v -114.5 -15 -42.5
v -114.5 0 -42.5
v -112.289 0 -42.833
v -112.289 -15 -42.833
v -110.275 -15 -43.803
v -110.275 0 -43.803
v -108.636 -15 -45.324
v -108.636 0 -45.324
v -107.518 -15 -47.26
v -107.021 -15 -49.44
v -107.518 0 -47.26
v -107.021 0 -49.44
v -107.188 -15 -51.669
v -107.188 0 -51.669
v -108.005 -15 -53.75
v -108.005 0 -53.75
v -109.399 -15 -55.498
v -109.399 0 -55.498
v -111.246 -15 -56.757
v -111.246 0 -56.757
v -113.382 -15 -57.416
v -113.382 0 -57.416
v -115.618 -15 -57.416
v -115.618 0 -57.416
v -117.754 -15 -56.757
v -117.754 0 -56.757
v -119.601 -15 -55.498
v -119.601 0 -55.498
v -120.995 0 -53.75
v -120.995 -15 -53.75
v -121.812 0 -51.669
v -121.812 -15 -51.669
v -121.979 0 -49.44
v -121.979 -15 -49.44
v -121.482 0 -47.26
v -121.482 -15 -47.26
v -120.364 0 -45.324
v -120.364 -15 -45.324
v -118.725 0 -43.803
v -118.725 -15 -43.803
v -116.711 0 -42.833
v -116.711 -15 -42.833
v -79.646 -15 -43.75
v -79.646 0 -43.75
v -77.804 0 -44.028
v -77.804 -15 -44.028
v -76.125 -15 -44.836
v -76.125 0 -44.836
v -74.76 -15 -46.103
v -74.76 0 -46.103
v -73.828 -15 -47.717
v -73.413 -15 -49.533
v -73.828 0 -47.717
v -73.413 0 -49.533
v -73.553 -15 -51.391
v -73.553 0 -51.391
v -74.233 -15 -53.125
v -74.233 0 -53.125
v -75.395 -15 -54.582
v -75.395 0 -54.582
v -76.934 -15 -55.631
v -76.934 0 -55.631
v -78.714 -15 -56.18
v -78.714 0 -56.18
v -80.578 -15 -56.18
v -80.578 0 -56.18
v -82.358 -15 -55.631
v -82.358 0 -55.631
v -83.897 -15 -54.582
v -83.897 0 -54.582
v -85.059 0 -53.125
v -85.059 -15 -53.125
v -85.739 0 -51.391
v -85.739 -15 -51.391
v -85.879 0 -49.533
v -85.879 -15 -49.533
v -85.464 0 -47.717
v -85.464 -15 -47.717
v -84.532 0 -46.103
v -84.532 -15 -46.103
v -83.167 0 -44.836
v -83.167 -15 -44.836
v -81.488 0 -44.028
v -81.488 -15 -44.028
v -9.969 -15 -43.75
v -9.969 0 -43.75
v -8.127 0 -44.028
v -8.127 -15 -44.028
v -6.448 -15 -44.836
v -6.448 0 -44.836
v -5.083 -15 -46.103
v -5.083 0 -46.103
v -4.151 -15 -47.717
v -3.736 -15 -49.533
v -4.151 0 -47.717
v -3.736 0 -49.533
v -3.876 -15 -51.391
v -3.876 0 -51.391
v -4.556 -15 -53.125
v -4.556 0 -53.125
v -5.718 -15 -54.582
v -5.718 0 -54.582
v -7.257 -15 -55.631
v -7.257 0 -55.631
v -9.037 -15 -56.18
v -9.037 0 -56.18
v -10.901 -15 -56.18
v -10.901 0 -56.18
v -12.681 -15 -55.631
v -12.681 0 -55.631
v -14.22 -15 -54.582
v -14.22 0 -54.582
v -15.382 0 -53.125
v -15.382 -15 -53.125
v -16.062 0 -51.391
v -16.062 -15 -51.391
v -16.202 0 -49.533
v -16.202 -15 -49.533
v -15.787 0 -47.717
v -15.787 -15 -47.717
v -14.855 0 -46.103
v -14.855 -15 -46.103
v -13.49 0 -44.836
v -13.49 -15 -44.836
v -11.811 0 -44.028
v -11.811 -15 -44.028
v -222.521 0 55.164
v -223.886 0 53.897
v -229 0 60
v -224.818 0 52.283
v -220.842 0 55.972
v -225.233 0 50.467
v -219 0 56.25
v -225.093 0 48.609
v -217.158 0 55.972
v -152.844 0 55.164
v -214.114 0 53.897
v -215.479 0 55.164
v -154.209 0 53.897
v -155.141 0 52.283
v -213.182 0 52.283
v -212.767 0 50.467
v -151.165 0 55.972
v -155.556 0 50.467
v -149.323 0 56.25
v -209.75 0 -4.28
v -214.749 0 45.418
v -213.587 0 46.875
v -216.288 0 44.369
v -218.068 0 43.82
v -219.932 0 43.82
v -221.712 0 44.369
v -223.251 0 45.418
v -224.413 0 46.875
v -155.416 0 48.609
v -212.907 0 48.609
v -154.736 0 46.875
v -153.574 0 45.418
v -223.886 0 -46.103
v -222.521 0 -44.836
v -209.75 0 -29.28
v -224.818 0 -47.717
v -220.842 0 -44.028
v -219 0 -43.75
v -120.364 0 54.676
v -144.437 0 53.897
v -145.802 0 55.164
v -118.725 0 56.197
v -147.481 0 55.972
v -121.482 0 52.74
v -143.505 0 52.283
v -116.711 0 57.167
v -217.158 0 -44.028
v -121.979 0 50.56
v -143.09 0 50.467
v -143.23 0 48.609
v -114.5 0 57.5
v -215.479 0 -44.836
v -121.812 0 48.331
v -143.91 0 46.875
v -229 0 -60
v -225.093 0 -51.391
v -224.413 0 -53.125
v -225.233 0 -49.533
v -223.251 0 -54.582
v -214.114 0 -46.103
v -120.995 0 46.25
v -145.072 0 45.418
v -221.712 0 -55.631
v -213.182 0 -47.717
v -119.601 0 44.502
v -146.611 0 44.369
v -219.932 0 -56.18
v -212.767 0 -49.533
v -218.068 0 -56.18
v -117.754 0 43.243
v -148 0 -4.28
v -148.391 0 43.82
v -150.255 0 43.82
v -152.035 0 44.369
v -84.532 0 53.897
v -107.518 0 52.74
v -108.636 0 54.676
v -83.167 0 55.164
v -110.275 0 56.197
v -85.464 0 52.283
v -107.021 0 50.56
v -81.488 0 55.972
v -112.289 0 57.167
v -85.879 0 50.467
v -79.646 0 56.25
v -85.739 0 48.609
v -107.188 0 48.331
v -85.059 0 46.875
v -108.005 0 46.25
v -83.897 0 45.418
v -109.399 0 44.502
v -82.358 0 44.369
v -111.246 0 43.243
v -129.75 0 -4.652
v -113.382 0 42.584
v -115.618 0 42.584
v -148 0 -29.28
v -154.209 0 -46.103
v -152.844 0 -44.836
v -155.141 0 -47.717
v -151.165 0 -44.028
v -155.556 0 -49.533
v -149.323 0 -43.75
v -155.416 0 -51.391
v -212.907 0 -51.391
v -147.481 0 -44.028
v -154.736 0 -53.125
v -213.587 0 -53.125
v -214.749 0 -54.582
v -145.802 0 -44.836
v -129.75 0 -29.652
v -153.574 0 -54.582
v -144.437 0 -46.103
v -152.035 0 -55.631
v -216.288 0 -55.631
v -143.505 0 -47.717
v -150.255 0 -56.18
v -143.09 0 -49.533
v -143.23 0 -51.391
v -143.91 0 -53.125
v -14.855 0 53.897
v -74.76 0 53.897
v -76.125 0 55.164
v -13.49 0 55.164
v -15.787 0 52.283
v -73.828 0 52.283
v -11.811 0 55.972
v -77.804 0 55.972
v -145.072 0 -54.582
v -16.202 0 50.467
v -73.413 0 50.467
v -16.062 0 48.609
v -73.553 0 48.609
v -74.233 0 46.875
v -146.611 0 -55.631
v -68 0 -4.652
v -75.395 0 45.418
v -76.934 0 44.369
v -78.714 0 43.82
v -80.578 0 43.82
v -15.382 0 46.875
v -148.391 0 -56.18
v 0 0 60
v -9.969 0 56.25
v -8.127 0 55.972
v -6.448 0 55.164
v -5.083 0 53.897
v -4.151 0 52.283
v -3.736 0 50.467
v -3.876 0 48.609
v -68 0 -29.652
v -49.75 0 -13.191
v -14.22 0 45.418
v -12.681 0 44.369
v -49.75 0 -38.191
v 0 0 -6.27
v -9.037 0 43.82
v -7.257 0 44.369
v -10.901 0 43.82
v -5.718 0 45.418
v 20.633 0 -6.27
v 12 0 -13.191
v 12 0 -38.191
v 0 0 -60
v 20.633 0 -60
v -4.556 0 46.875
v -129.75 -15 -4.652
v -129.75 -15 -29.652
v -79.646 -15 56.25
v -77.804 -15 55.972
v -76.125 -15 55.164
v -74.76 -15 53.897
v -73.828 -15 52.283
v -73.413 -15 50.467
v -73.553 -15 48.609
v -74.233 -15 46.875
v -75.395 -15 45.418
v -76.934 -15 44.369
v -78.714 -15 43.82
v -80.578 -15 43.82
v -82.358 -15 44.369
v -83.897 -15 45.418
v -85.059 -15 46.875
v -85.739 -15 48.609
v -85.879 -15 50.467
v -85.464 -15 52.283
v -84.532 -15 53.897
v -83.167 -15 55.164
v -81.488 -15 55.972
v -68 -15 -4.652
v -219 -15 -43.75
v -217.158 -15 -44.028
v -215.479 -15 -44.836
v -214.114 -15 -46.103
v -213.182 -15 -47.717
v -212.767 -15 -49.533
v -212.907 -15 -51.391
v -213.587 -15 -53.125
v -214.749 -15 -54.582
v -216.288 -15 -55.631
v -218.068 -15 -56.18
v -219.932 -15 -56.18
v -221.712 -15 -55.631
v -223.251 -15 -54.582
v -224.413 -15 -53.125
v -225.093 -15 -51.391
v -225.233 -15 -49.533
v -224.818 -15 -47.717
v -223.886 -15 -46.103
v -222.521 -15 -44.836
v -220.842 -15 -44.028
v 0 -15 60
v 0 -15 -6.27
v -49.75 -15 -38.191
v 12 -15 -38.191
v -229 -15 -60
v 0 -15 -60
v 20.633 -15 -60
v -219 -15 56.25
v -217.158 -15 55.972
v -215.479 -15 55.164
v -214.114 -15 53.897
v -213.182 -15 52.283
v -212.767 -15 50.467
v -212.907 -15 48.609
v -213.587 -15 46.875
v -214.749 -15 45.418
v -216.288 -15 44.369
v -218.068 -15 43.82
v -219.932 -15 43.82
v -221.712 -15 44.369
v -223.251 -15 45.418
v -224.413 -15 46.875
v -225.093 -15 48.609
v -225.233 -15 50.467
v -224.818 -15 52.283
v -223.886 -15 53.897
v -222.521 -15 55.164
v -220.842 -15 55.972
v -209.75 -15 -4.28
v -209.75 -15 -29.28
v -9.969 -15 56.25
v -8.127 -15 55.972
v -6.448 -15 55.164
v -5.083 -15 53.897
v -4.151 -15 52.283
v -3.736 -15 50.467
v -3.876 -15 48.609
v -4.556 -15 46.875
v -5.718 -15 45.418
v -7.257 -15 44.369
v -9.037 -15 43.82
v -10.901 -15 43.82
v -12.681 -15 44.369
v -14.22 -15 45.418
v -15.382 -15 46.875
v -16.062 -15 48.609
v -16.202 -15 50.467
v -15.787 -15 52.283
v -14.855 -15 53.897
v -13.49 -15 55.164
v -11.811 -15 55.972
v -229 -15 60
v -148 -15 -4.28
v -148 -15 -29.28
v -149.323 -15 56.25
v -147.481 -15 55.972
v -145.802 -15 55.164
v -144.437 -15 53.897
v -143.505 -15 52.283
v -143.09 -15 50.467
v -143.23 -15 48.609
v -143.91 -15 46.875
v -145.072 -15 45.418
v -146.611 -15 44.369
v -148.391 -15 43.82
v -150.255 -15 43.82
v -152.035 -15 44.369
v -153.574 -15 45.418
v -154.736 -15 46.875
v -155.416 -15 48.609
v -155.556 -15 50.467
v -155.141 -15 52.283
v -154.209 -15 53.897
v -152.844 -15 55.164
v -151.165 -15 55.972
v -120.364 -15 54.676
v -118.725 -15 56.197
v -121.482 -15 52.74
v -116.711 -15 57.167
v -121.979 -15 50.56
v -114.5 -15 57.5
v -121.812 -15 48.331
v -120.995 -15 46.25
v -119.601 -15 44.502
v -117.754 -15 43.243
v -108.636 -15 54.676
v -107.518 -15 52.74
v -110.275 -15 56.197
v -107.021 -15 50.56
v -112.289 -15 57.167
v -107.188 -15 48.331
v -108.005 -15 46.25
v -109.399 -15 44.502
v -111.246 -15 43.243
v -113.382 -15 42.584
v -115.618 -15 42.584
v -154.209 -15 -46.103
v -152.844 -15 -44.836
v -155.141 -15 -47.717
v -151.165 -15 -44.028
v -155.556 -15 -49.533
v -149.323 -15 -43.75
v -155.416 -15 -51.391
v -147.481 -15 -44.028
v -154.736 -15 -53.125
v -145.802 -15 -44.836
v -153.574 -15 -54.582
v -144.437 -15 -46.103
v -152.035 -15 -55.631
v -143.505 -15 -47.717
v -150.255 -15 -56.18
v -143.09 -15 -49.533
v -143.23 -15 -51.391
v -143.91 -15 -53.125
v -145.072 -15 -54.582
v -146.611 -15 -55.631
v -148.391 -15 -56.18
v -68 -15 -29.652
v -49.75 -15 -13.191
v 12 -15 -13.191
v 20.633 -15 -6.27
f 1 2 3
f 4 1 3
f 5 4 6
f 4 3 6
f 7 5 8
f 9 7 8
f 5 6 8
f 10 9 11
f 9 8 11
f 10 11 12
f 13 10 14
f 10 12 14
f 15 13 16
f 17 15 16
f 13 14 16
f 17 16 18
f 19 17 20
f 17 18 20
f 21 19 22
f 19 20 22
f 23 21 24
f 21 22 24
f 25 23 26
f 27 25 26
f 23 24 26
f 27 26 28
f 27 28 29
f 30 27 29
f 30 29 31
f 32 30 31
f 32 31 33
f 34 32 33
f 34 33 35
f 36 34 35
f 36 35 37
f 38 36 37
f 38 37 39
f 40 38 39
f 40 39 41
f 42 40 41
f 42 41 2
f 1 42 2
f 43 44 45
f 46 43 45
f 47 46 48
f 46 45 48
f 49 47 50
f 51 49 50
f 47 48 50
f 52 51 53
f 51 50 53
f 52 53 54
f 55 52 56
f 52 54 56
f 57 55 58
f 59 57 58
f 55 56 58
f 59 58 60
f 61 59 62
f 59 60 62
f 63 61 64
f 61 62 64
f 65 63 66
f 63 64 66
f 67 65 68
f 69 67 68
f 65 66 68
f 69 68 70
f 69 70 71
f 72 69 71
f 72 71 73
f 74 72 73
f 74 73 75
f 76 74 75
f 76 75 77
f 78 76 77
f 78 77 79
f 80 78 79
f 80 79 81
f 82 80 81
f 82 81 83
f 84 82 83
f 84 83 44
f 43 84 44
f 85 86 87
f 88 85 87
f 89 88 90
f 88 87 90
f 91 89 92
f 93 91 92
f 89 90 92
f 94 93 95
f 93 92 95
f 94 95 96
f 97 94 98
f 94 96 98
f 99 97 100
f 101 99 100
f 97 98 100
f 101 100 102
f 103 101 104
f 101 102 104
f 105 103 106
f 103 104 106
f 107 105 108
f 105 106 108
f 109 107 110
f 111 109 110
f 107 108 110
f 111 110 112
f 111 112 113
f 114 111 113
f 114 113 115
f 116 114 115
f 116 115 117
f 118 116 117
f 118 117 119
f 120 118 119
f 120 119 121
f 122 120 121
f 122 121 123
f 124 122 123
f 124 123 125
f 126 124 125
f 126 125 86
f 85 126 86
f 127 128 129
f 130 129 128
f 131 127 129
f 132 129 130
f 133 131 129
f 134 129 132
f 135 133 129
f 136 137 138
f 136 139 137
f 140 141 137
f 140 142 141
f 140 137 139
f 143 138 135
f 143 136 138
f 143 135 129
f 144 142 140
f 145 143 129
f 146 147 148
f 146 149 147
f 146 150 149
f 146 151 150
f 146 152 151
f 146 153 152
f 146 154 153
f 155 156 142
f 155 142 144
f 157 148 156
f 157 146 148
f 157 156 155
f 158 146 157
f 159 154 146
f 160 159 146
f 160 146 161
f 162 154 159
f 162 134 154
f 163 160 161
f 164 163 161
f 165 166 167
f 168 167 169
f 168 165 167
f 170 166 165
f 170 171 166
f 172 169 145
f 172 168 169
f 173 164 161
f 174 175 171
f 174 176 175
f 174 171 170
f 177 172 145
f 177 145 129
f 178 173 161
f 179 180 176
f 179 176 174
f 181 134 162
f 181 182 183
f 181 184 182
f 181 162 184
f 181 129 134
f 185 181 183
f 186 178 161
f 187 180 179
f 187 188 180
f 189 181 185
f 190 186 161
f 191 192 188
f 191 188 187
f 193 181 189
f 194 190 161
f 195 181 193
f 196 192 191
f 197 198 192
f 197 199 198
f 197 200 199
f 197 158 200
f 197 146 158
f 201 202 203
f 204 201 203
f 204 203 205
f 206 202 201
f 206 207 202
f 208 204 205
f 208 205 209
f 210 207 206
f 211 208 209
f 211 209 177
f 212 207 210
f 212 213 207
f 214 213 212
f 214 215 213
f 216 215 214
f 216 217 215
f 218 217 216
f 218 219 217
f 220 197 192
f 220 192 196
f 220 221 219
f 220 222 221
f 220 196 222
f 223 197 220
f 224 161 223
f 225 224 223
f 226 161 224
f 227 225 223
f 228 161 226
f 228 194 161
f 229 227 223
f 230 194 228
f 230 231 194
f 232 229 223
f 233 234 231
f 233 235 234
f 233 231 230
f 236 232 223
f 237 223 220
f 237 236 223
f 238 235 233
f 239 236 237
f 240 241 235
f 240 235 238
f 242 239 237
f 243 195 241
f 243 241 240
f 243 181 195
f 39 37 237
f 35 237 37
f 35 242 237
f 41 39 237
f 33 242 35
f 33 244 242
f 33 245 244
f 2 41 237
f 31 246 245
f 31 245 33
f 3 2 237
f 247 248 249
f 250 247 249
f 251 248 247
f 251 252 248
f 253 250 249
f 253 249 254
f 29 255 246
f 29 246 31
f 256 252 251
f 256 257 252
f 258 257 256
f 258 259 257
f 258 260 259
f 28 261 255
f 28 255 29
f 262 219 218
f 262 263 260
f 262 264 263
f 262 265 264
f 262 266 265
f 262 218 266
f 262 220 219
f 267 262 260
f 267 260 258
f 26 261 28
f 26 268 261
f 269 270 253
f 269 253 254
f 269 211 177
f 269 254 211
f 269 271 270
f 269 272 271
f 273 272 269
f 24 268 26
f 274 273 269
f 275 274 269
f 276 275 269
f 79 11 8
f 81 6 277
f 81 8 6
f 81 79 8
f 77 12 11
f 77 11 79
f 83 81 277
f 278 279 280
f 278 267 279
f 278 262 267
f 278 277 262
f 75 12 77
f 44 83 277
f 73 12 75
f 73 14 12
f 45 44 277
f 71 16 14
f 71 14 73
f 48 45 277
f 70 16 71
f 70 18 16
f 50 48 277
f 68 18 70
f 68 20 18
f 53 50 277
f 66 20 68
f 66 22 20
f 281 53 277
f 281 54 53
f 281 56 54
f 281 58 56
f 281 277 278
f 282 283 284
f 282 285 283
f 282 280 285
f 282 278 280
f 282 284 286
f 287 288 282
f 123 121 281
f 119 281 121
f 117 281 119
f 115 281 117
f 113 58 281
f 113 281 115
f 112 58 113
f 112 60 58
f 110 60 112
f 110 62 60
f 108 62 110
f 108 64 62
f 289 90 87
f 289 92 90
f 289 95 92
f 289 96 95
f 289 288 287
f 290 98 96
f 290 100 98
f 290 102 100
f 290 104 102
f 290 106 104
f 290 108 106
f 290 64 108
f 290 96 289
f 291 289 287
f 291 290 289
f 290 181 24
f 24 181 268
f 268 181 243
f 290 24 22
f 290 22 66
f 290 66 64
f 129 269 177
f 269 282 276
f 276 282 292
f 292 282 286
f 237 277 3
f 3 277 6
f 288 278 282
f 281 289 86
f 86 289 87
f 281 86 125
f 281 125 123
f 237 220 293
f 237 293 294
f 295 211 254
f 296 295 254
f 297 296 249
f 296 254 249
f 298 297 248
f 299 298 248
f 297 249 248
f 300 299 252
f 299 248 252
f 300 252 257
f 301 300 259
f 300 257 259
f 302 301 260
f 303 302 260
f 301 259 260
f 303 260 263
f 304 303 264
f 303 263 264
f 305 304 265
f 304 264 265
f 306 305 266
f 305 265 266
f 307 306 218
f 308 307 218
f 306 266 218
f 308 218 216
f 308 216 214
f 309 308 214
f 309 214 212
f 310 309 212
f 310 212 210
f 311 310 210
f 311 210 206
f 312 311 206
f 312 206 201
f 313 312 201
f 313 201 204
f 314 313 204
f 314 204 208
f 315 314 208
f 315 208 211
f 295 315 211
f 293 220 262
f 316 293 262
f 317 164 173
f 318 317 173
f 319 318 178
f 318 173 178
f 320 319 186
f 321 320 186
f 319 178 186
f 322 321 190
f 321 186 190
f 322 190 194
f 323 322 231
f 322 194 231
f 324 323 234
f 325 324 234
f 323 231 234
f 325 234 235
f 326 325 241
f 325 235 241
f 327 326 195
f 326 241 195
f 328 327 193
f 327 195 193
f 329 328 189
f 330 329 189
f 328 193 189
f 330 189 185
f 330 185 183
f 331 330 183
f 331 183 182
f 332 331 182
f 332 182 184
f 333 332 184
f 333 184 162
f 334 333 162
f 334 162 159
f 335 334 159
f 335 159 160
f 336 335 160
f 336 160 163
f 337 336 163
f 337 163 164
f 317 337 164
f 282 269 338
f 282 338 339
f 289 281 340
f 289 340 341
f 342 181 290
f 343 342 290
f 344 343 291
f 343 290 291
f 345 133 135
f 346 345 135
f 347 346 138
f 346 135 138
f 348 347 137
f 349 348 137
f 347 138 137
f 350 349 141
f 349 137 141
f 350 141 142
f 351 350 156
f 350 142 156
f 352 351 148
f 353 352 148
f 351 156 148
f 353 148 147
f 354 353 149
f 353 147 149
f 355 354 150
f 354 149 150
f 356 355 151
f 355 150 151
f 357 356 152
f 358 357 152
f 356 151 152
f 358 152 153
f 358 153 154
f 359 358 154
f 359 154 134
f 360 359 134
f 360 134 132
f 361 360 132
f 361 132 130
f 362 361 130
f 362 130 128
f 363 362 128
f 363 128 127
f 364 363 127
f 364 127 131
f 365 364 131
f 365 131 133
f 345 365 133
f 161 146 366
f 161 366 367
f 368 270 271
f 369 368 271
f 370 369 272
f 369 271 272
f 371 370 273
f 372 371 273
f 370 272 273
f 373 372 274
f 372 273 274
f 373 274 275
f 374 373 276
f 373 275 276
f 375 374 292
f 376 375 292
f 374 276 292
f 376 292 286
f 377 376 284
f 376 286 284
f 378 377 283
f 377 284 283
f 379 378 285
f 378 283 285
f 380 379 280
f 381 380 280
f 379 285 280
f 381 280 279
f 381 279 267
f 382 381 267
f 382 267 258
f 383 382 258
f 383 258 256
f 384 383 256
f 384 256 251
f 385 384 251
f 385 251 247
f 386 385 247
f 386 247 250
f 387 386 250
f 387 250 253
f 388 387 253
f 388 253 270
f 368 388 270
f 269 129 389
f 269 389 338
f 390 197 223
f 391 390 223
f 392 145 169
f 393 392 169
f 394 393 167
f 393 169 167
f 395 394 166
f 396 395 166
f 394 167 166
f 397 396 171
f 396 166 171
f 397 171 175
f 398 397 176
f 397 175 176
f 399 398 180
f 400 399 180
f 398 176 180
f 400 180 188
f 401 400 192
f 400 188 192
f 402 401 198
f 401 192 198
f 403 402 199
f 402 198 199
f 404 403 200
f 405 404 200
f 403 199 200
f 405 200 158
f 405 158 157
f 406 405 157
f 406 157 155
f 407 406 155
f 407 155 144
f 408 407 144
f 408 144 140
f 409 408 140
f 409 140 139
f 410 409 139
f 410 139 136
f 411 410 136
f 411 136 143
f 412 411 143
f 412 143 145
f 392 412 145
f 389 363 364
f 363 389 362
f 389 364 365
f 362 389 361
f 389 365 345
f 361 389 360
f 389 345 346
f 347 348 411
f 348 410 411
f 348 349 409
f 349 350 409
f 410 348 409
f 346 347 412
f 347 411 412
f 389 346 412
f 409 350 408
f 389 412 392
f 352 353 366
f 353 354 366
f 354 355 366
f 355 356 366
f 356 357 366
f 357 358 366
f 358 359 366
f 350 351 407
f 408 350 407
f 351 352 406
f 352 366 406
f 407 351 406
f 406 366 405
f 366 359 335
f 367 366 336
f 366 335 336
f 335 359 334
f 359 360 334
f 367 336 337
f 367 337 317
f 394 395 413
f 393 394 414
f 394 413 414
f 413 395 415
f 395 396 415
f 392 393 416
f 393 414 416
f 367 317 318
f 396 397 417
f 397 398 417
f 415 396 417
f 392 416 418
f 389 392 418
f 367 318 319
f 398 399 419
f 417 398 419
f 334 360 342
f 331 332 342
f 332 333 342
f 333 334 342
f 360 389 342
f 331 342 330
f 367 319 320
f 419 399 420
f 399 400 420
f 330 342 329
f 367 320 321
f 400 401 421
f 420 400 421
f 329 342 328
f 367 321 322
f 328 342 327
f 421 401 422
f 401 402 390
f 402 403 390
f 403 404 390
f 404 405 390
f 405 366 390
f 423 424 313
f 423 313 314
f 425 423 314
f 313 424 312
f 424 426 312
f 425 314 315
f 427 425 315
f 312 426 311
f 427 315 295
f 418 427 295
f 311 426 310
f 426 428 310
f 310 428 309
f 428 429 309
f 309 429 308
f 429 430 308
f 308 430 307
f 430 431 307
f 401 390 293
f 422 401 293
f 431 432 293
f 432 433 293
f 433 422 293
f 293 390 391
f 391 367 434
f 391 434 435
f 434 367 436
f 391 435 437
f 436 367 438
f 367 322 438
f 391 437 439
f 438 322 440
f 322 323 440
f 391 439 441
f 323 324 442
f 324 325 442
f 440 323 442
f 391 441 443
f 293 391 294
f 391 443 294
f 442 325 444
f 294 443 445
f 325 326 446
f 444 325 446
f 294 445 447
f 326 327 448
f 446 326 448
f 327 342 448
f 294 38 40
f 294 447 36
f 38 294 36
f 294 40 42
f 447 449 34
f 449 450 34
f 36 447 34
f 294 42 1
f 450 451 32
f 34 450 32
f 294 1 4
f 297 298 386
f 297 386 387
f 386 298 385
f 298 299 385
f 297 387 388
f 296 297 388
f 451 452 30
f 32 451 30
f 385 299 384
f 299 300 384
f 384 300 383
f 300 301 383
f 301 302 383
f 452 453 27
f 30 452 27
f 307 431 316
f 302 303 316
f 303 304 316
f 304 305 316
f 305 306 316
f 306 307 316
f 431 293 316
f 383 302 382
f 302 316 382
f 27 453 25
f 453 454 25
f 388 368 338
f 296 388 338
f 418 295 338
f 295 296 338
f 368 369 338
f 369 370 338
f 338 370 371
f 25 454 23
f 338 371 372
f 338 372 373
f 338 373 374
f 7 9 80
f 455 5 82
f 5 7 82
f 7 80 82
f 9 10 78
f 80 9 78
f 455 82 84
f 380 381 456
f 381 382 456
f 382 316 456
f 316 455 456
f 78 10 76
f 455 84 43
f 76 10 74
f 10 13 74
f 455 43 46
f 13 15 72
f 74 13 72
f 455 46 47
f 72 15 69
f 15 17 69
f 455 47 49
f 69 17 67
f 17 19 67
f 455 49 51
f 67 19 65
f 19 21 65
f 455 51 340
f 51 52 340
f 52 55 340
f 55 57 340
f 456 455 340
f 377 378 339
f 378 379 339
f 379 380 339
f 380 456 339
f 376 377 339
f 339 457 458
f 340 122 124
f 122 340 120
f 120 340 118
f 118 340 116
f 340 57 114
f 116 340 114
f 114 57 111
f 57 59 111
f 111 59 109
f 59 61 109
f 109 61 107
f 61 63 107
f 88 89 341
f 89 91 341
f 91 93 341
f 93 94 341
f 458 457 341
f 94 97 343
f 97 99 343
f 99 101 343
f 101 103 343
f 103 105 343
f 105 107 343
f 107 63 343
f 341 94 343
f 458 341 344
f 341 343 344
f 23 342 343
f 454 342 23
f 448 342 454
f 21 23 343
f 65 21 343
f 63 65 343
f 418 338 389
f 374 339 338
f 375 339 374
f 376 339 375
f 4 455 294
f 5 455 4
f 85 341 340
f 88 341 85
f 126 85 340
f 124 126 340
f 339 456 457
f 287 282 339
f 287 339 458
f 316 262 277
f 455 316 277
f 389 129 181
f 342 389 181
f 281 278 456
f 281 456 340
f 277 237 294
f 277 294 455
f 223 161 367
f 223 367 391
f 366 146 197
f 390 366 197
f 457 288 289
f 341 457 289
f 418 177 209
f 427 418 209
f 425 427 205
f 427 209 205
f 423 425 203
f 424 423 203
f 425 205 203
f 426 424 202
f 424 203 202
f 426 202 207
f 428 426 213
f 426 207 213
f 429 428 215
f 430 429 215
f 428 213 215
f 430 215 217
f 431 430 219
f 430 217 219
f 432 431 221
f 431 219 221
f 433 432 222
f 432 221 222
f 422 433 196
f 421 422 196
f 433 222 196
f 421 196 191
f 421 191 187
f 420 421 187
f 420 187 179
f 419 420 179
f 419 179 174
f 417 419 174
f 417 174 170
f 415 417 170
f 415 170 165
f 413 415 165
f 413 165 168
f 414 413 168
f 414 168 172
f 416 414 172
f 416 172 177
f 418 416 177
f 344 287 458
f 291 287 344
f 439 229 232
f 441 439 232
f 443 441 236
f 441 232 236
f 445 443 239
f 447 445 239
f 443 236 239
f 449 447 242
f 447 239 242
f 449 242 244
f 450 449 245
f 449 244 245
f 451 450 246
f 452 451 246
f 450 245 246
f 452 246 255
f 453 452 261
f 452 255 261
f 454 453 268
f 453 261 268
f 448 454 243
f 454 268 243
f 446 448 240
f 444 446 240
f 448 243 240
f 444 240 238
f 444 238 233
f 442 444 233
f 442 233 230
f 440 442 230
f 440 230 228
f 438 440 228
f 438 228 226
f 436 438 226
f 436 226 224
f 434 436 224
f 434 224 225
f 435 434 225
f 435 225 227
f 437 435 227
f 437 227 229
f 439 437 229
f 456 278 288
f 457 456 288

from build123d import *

# Parameters (mm, degrees)
SKETCH1_W           = 229
SKETCH1_H           = 120
BOSS_EXTRUDE1_DEPTH = 15
SKETCH2_W           = 20.632503002
SKETCH2_H           = 53.730004003
BOSS_EXTRUDE2_DEPTH = 15
CUT_EXTRUDE1_REACH  = 239.205
SKETCH3_W           = 61.75
SKETCH3_H           = 25
CUT_EXTRUDE2_REACH  = 239.205
SKETCH4_W           = 61.75
SKETCH4_H           = 25
CUT_EXTRUDE3_REACH  = 239.205
SKETCH5_W           = 61.75
SKETCH5_H           = 25
CUT_EXTRUDE5_REACH  = 239.205
SKETCH7_R           = 7.5
CUT_EXTRUDE7_REACH  = 239.205
SKETCH14_R          = 6.25


with BuildPart() as part:
    # Sketch1 → Boss-Extrude1 (new body)
    with BuildSketch(Plane(origin=(0, 0, 0), x_dir=(1, 0, 0), z_dir=(0, 1, 0))):
        with Locations((-114.5, 0)):
            Rectangle(SKETCH1_W, SKETCH1_H)
    extrude(amount=-BOSS_EXTRUDE1_DEPTH)

    # Sketch2 → Boss-Extrude2 (add)
    with BuildSketch(Plane(origin=(0, 0, 0), x_dir=(1, 0, 0), z_dir=(0, 1, 0))):
        with Locations((10.316251501, 33.134997999)):
            Rectangle(SKETCH2_W, SKETCH2_H)
    extrude(amount=-BOSS_EXTRUDE2_DEPTH)

    # Sketch3 → Cut-Extrude1 (cut, up to next)
    with BuildSketch(Plane(origin=(0, 0, 0), x_dir=(1, 0, 0), z_dir=(0, 1, 0)), mode=Mode.PRIVATE) as cut_extrude1_sk1:
        with Locations((-18.875, 25.691000385)):
            Rectangle(SKETCH3_W, SKETCH3_H)
    cut_extrude1_tool1 = extrude(cut_extrude1_sk1.sketch, amount=-CUT_EXTRUDE1_REACH, mode=Mode.PRIVATE) & part.part
    add(cut_extrude1_tool1.solids().sort_by_distance((-18.875, 0, -25.691))[0], mode=Mode.SUBTRACT)

    # Sketch4 → Cut-Extrude2 (cut, up to next)
    with BuildSketch(Plane(origin=(0, 0, 0), x_dir=(1, 0, 0), z_dir=(0, 1, 0)), mode=Mode.PRIVATE) as cut_extrude2_sk1:
        with Locations((-98.875, 17.152366083)):
            Rectangle(SKETCH4_W, SKETCH4_H)
    cut_extrude2_tool1 = extrude(cut_extrude2_sk1.sketch, amount=-CUT_EXTRUDE2_REACH, mode=Mode.PRIVATE) & part.part
    add(cut_extrude2_tool1.solids().sort_by_distance((-98.875, 0, -17.152366))[0], mode=Mode.SUBTRACT)

    # Sketch5 → Cut-Extrude3 (cut, up to next)
    with BuildSketch(Plane(origin=(0, 0, 0), x_dir=(1, 0, 0), z_dir=(0, 1, 0)), mode=Mode.PRIVATE) as cut_extrude3_sk1:
        with Locations((-178.875, 16.78)):
            Rectangle(SKETCH5_W, SKETCH5_H)
    cut_extrude3_tool1 = extrude(cut_extrude3_sk1.sketch, amount=-CUT_EXTRUDE3_REACH, mode=Mode.PRIVATE) & part.part
    add(cut_extrude3_tool1.solids().sort_by_distance((-178.875, 0, -16.78))[0], mode=Mode.SUBTRACT)

    # Sketch7 → Cut-Extrude5 (cut, up to next)
    with BuildSketch(Plane(origin=(0, 0, 0), x_dir=(1, 0, 0), z_dir=(0, 1, 0)), mode=Mode.PRIVATE) as cut_extrude5_sk1:
        with Locations(Location((-114.5, 50, 0), (0, 0, 270))):
            Circle(SKETCH7_R)
    cut_extrude5_tool1 = extrude(cut_extrude5_sk1.sketch, amount=-CUT_EXTRUDE5_REACH, mode=Mode.PRIVATE) & part.part
    # Sketch7 → Cut-Extrude5 (cut, up to next)
    with BuildSketch(Plane(origin=(0, 0, 0), x_dir=(1, 0, 0), z_dir=(0, 1, 0)), mode=Mode.PRIVATE) as cut_extrude5_sk2:
        with Locations(Location((-114.5, -50, 0), (0, 0, 270))):
            Circle(SKETCH7_R)
    cut_extrude5_tool2 = extrude(cut_extrude5_sk2.sketch, amount=-CUT_EXTRUDE5_REACH, mode=Mode.PRIVATE) & part.part
    add(cut_extrude5_tool1.solids().sort_by_distance((-114.5, 0, -50))[0], mode=Mode.SUBTRACT)
    add(cut_extrude5_tool2.solids().sort_by_distance((-114.5, 0, 50))[0], mode=Mode.SUBTRACT)

    # Sketch14 → Cut-Extrude7 (cut, up to next)
    with BuildSketch(Plane(origin=(0, 0, 0), x_dir=(1, 0, 0), z_dir=(0, 1, 0)), mode=Mode.PRIVATE) as cut_extrude7_sk1:
        with Locations(Location((-219, 50, 0), (0, 0, 270))):
            Circle(SKETCH14_R)
    cut_extrude7_tool1 = extrude(cut_extrude7_sk1.sketch, amount=-CUT_EXTRUDE7_REACH, mode=Mode.PRIVATE) & part.part
    # Sketch14 → Cut-Extrude7 (cut, up to next)
    with BuildSketch(Plane(origin=(0, 0, 0), x_dir=(1, 0, 0), z_dir=(0, 1, 0)), mode=Mode.PRIVATE) as cut_extrude7_sk2:
        with Locations(Location((-219, -50, 0), (0, 0, 270))):
            Circle(SKETCH14_R)
    cut_extrude7_tool2 = extrude(cut_extrude7_sk2.sketch, amount=-CUT_EXTRUDE7_REACH, mode=Mode.PRIVATE) & part.part
    # Sketch14 → Cut-Extrude7 (cut, up to next)
    with BuildSketch(Plane(origin=(0, 0, 0), x_dir=(1, 0, 0), z_dir=(0, 1, 0)), mode=Mode.PRIVATE) as cut_extrude7_sk3:
        with Locations(Location((-149.323, -50, 0), (0, 0, 270))):
            Circle(SKETCH14_R)
    cut_extrude7_tool3 = extrude(cut_extrude7_sk3.sketch, amount=-CUT_EXTRUDE7_REACH, mode=Mode.PRIVATE) & part.part
    # Sketch14 → Cut-Extrude7 (cut, up to next)
    with BuildSketch(Plane(origin=(0, 0, 0), x_dir=(1, 0, 0), z_dir=(0, 1, 0)), mode=Mode.PRIVATE) as cut_extrude7_sk4:
        with Locations(Location((-79.646, -50, 0), (0, 0, 270))):
            Circle(SKETCH14_R)
    cut_extrude7_tool4 = extrude(cut_extrude7_sk4.sketch, amount=-CUT_EXTRUDE7_REACH, mode=Mode.PRIVATE) & part.part
    # Sketch14 → Cut-Extrude7 (cut, up to next)
    with BuildSketch(Plane(origin=(0, 0, 0), x_dir=(1, 0, 0), z_dir=(0, 1, 0)), mode=Mode.PRIVATE) as cut_extrude7_sk5:
        with Locations(Location((-9.969, -50, 0), (0, 0, 270))):
            Circle(SKETCH14_R)
    cut_extrude7_tool5 = extrude(cut_extrude7_sk5.sketch, amount=-CUT_EXTRUDE7_REACH, mode=Mode.PRIVATE) & part.part
    # Sketch14 → Cut-Extrude7 (cut, up to next)
    with BuildSketch(Plane(origin=(0, 0, 0), x_dir=(1, 0, 0), z_dir=(0, 1, 0)), mode=Mode.PRIVATE) as cut_extrude7_sk6:
        with Locations(Location((-9.969, 50, 0), (0, 0, 270))):
            Circle(SKETCH14_R)
    cut_extrude7_tool6 = extrude(cut_extrude7_sk6.sketch, amount=-CUT_EXTRUDE7_REACH, mode=Mode.PRIVATE) & part.part
    # Sketch14 → Cut-Extrude7 (cut, up to next)
    with BuildSketch(Plane(origin=(0, 0, 0), x_dir=(1, 0, 0), z_dir=(0, 1, 0)), mode=Mode.PRIVATE) as cut_extrude7_sk7:
        with Locations(Location((-79.646, 50, 0), (0, 0, 270))):
            Circle(SKETCH14_R)
    cut_extrude7_tool7 = extrude(cut_extrude7_sk7.sketch, amount=-CUT_EXTRUDE7_REACH, mode=Mode.PRIVATE) & part.part
    # Sketch14 → Cut-Extrude7 (cut, up to next)
    with BuildSketch(Plane(origin=(0, 0, 0), x_dir=(1, 0, 0), z_dir=(0, 1, 0)), mode=Mode.PRIVATE) as cut_extrude7_sk8:
        with Locations(Location((-149.323, 50, 0), (0, 0, 270))):
            Circle(SKETCH14_R)
    cut_extrude7_tool8 = extrude(cut_extrude7_sk8.sketch, amount=-CUT_EXTRUDE7_REACH, mode=Mode.PRIVATE) & part.part
    add(cut_extrude7_tool1.solids().sort_by_distance((-219, 0, -50))[0], mode=Mode.SUBTRACT)
    add(cut_extrude7_tool2.solids().sort_by_distance((-219, 0, 50))[0], mode=Mode.SUBTRACT)
    add(cut_extrude7_tool3.solids().sort_by_distance((-149.323, 0, 50))[0], mode=Mode.SUBTRACT)
    add(cut_extrude7_tool4.solids().sort_by_distance((-79.646, 0, 50))[0], mode=Mode.SUBTRACT)
    add(cut_extrude7_tool5.solids().sort_by_distance((-9.969, 0, 50))[0], mode=Mode.SUBTRACT)
    add(cut_extrude7_tool6.solids().sort_by_distance((-9.969, 0, -50))[0], mode=Mode.SUBTRACT)
    add(cut_extrude7_tool7.solids().sort_by_distance((-79.646, 0, -50))[0], mode=Mode.SUBTRACT)
    add(cut_extrude7_tool8.solids().sort_by_distance((-149.323, 0, -50))[0], mode=Mode.SUBTRACT)


solid = part.part
